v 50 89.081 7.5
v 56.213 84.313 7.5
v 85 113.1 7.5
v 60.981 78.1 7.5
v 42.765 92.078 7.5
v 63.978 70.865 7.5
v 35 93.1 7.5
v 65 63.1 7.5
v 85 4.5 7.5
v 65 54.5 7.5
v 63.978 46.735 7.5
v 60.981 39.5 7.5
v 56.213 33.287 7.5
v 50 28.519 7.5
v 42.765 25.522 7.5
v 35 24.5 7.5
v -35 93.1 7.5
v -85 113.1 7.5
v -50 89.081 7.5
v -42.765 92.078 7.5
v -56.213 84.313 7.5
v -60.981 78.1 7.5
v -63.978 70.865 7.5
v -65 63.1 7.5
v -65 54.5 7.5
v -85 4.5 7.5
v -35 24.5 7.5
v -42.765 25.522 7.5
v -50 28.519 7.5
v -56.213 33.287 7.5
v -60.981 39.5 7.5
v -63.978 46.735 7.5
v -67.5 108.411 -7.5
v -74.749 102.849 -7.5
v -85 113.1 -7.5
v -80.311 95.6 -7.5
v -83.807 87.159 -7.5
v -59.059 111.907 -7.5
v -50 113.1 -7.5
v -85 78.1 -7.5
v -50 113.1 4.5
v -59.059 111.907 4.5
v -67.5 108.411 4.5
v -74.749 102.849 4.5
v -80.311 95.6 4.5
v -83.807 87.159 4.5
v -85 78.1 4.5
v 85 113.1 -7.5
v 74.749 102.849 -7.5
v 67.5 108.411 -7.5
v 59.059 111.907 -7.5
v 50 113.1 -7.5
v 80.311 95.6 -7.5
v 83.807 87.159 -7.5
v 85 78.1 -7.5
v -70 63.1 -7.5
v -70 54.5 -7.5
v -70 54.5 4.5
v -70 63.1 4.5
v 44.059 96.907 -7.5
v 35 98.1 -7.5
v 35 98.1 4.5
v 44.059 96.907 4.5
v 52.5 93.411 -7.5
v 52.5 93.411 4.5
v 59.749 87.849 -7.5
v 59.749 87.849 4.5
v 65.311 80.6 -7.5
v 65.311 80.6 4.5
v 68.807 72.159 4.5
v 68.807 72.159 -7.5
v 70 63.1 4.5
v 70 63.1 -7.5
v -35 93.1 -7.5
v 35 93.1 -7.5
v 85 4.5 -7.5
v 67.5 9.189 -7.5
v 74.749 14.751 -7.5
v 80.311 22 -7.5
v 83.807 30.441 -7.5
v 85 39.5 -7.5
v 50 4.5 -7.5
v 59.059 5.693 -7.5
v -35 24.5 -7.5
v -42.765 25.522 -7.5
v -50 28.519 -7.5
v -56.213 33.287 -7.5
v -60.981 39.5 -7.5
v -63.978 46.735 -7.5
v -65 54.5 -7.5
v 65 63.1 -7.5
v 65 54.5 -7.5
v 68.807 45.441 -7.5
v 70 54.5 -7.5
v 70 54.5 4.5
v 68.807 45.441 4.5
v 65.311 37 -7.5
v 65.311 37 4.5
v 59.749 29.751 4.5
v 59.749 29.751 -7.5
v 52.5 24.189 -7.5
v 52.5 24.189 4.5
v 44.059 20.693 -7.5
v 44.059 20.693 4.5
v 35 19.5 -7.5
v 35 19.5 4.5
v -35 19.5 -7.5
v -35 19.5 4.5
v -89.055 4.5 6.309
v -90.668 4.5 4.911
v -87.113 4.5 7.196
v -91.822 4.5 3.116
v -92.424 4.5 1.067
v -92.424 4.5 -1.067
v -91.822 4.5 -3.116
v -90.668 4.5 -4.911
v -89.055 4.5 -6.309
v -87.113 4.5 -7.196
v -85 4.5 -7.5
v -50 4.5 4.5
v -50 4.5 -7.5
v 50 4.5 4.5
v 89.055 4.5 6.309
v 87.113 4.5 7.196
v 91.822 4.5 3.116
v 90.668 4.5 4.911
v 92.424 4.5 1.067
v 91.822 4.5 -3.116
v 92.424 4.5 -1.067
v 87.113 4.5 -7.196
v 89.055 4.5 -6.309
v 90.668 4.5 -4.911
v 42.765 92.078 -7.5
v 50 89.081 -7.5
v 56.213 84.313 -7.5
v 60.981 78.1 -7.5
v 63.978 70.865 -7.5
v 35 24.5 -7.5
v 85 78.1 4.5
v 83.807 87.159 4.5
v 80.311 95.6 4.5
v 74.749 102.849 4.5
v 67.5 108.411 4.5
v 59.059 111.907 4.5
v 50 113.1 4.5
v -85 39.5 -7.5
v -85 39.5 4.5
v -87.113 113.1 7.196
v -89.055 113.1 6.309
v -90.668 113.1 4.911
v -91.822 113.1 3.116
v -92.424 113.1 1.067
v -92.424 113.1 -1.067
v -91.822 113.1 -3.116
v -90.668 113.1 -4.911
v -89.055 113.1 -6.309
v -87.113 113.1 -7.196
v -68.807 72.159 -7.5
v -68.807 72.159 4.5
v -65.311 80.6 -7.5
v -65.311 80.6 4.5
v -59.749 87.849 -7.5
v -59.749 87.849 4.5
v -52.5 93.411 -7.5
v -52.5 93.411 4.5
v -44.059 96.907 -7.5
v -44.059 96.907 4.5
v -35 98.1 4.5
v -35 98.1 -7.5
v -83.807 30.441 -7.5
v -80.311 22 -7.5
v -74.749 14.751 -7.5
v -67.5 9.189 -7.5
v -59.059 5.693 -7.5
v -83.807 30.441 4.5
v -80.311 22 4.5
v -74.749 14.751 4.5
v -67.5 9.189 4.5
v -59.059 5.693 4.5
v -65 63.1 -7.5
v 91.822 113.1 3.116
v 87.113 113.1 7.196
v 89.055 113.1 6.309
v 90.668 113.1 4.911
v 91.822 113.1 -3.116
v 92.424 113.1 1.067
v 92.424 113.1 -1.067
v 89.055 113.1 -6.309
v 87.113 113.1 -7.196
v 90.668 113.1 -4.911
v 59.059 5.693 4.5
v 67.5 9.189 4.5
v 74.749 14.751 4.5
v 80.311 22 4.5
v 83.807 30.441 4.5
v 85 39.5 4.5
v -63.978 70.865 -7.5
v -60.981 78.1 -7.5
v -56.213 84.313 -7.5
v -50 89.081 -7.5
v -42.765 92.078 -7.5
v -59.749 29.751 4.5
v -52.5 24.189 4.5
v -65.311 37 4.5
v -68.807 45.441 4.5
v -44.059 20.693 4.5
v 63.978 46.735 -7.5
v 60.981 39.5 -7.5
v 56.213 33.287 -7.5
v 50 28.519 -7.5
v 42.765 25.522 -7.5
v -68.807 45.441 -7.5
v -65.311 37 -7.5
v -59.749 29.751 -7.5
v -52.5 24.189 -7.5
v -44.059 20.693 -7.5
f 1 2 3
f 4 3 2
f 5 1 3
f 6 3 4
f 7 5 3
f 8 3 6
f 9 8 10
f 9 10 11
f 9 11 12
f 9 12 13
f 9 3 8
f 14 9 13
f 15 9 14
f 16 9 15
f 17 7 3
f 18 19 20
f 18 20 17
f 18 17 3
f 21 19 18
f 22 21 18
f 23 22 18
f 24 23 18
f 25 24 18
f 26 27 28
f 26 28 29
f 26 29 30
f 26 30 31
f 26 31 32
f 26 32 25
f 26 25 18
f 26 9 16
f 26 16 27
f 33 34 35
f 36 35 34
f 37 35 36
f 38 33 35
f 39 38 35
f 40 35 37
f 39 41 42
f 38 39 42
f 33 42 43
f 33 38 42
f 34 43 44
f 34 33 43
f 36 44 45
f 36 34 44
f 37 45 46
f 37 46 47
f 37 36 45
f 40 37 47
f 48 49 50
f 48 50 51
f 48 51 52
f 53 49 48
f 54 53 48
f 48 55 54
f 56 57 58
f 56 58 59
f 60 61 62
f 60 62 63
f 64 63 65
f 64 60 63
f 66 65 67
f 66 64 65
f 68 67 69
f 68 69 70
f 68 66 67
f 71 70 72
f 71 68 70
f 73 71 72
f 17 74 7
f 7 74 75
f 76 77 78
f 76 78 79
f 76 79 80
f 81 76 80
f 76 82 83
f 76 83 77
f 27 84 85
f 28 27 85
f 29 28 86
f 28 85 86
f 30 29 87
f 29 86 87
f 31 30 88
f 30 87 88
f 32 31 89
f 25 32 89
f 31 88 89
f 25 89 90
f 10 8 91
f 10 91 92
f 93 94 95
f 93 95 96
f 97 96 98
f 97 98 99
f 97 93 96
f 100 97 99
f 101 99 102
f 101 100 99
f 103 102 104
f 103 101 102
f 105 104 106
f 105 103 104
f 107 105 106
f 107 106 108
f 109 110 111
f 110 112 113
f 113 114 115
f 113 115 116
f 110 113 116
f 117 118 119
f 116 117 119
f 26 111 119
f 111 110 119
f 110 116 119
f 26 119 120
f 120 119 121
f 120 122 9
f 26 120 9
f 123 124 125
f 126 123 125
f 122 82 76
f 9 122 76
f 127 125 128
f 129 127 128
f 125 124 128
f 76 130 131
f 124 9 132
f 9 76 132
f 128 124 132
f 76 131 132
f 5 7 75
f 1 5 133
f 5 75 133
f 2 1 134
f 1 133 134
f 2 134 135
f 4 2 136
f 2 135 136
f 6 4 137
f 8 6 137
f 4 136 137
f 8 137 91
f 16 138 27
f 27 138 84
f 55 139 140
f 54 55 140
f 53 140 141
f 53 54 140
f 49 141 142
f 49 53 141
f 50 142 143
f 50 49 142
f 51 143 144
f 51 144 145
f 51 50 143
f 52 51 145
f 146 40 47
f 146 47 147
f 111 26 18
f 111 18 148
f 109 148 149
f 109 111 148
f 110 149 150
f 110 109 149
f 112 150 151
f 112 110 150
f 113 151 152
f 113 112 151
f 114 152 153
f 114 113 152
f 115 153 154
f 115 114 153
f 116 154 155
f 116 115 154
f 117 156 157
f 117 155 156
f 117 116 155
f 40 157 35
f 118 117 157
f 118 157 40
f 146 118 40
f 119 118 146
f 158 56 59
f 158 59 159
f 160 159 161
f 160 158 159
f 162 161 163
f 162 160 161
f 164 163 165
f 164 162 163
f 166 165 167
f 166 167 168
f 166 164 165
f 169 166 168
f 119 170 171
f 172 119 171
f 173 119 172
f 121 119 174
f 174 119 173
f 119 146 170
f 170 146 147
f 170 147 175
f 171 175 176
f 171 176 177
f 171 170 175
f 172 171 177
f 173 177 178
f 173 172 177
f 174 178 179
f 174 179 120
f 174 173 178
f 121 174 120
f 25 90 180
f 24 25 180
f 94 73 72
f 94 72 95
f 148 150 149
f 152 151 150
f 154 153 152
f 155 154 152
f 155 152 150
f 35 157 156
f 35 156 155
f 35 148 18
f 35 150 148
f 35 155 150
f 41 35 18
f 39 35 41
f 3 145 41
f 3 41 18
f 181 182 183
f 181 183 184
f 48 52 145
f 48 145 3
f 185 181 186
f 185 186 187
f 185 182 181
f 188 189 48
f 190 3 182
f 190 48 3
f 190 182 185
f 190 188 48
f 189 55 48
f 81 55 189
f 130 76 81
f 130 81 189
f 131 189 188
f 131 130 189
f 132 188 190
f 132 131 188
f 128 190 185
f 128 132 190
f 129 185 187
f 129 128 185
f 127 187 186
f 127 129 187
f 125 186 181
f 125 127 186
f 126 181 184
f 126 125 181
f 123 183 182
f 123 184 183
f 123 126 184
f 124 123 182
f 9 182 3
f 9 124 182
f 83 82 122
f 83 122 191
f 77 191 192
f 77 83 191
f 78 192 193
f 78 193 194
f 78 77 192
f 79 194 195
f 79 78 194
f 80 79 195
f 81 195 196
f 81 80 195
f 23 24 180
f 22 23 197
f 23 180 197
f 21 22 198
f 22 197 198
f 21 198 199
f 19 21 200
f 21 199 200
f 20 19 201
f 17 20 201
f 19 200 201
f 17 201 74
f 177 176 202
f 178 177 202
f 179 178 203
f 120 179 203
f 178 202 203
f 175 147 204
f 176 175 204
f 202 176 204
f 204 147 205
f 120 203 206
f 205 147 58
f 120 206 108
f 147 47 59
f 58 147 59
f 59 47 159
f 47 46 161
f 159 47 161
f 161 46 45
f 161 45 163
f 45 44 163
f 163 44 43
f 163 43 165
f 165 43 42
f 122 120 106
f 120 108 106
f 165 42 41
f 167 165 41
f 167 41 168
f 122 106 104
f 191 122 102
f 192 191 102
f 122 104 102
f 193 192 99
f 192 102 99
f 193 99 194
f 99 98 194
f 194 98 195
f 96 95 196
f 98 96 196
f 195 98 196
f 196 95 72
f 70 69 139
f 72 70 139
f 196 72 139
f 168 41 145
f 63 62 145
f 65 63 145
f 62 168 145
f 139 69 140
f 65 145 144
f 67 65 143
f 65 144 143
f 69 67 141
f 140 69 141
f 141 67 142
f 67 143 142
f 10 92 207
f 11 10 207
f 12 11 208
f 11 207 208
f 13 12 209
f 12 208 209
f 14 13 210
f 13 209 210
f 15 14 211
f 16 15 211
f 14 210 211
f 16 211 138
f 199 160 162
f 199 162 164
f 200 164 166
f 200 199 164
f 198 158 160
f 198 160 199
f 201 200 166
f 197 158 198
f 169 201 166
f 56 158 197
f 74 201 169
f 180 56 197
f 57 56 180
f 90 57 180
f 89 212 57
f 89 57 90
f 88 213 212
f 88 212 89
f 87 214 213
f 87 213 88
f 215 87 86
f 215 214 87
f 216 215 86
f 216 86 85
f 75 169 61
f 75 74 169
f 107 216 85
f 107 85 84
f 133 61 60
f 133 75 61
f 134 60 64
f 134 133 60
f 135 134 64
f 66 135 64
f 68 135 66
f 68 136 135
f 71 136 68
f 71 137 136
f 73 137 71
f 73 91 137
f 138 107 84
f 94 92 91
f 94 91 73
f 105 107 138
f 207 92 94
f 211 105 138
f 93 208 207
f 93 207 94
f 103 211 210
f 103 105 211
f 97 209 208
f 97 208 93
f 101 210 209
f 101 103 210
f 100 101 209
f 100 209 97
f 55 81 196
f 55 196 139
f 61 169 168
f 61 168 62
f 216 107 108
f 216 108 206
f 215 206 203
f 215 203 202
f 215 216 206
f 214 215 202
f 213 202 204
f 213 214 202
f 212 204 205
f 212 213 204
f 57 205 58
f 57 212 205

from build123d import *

# Parameters (mm, degrees)
BOSS_EXTRUDE1_DEPTH = 117.6
CUT_EXTRUDE4_DEPTH  = 12
CUT_EXTRUDE6_DEPTH  = 151.36957804
CUT_EXTRUDE7_DEPTH  = 4.5
CUT_EXTRUDE8_START  = 113.1
CUT_EXTRUDE8_DEPTH  = 4.5
CUT_EXTRUDE9_DEPTH  = 4.5
CUT_EXTRUDE10_START = 113.1
CUT_EXTRUDE10_DEPTH = 4.5


with BuildPart() as part:
    # Sketch2 → Boss-Extrude1 (new body)
    with BuildSketch(Plane(origin=(0, 0, 0), x_dir=(1, 0, 0), z_dir=(0, 1, 0))):
        with BuildLine():
            Line((85, -7.5), (-85, -7.5))
            ThreePointArc((-85, -7.5), (-92.5, 0), (-85, 7.5))
            Line((-85, 7.5), (85, 7.5))
            ThreePointArc((85, 7.5), (92.5, 0), (85, -7.5))
        make_face()
    extrude(amount=BOSS_EXTRUDE1_DEPTH)

    # Sketch3 → Cut-Extrude4 (cut)
    with BuildSketch(Plane(origin=(0, 0, -7.5), x_dir=(-1, 0, 0), z_dir=(0, 0, -1))):
        with BuildLine():
            Line((-50, 113.1), (50, 113.1))
            ThreePointArc((50, 113.1), (74.748737342, 102.848737342), (85, 78.1))
            Line((85, 78.1), (85, 39.5))
            ThreePointArc((85, 39.5), (74.748737342, 14.751262658), (50, 4.5))
            Line((50, 4.5), (-50, 4.5))
            ThreePointArc((-50, 4.5), (-74.748737342, 14.751262658), (-85, 39.5))
            Line((-85, 39.5), (-85, 78.1))
            ThreePointArc((-85, 78.1), (-74.748737342, 102.848737342), (-50, 113.1))
        make_face()
        with BuildLine():
            Line((-70, 63.1), (-70, 54.5))
            ThreePointArc((-70, 54.5), (-59.748737342, 29.751262658), (-35, 19.5))
            Line((-35, 19.5), (35, 19.5))
            ThreePointArc((35, 19.5), (59.748737342, 29.751262658), (70, 54.5))
            Line((70, 54.5), (70, 63.1))
            ThreePointArc((70, 63.1), (59.748737342, 87.848737342), (35, 98.1))
            Line((35, 98.1), (-35, 98.1))
            ThreePointArc((-35, 98.1), (-59.748737342, 87.848737342), (-70, 63.1))
        make_face(mode=Mode.SUBTRACT)
    extrude(amount=-CUT_EXTRUDE4_DEPTH, mode=Mode.SUBTRACT)

    # Sketch6 → Cut-Extrude6 (cut, through all)
    with BuildSketch(Plane(origin=(0, 0, -7.5), x_dir=(-1, 0, 0), z_dir=(0, 0, -1))):
        with BuildLine():
            Line((-35, 24.5), (35, 24.5))
            ThreePointArc((35, 24.5), (56.213203436, 33.286796564), (65, 54.5))
            Line((65, 54.5), (65, 63.1))
            ThreePointArc((65, 63.1), (56.213203436, 84.313203436), (35, 93.1))
            Line((35, 93.1), (-35, 93.1))
            ThreePointArc((-35, 93.1), (-56.213203436, 84.313203436), (-65, 63.1))
            Line((-65, 63.1), (-65, 54.5))
            ThreePointArc((-65, 54.5), (-56.213203436, 33.286796564), (-35, 24.5))
        make_face()
    extrude(amount=-CUT_EXTRUDE6_DEPTH, mode=Mode.SUBTRACT)

    # Sketch2_6 → Cut-Extrude7 (cut)
    with BuildSketch(Plane(origin=(0, 0, 0), x_dir=(1, 0, 0), z_dir=(0, 1, 0))):
        with BuildLine():
            Line((-8.2248772, -2.5), (8.2248772, -2.5))
            Line((8.2248772, -2.5), (15.34156858, -1.994983292))
            ThreePointArc((15.34156858, -1.994983292), (17.2, 0), (15.34156858, 1.994983292))
            Line((15.34156858, 1.994983292), (1.88348082, 2.95))
            ThreePointArc((1.88348082, 2.95), (0, 3.5), (-1.88348082, 2.95))
            Line((-1.88348082, 2.95), (-15.34156858, 1.994983292))
            ThreePointArc((-15.34156858, 1.994983292), (-17.2, 0), (-15.34156858, -1.994983292))
            Line((-15.34156858, -1.994983292), (-8.2248772, -2.5))
        make_face()
        with BuildLine():
            Line((1.88348082, -2.95), (8.2248772, -2.5))
            Line((8.2248772, -2.5), (-8.2248772, -2.5))
            Line((-8.2248772, -2.5), (-1.88348082, -2.95))
            ThreePointArc((-1.88348082, -2.95), (0, -3.5), (1.88348082, -2.95))
        make_face()
    extrude(amount=CUT_EXTRUDE7_DEPTH, mode=Mode.SUBTRACT)

    # Sketch2_7 → Cut-Extrude8 (cut)
    with BuildSketch(Plane(origin=(0, 0, 0), x_dir=(1, 0, 0), z_dir=(0, 1, 0)).offset(CUT_EXTRUDE8_START)):
        with BuildLine():
            Line((-8.2248772, -2.5), (8.2248772, -2.5))
            Line((8.2248772, -2.5), (15.34156858, -1.994983292))
            ThreePointArc((15.34156858, -1.994983292), (17.2, 0), (15.34156858, 1.994983292))
            Line((15.34156858, 1.994983292), (1.88348082, 2.95))
            ThreePointArc((1.88348082, 2.95), (0, 3.5), (-1.88348082, 2.95))
            Line((-1.88348082, 2.95), (-15.34156858, 1.994983292))
            ThreePointArc((-15.34156858, 1.994983292), (-17.2, 0), (-15.34156858, -1.994983292))
            Line((-15.34156858, -1.994983292), (-8.2248772, -2.5))
        make_face()
        with BuildLine():
            Line((1.88348082, -2.95), (8.2248772, -2.5))
            Line((8.2248772, -2.5), (-8.2248772, -2.5))
            Line((-8.2248772, -2.5), (-1.88348082, -2.95))
            ThreePointArc((-1.88348082, -2.95), (0, -3.5), (1.88348082, -2.95))
        make_face()
    extrude(amount=CUT_EXTRUDE8_DEPTH, mode=Mode.SUBTRACT)

    # Sketch2_8 → Cut-Extrude9 (cut)
    with BuildSketch(Plane(origin=(0, 0, 0), x_dir=(1, 0, 0), z_dir=(0, 1, 0))):
        with BuildLine():
            Line((85, -2.5), (85, 7.5))
            Line((85, 7.5), (-85, 7.5))
            Line((-85, 7.5), (-85, -2.5))
            Line((-85, -2.5), (-8.2248772, -2.5))
            Line((-8.2248772, -2.5), (-15.34156858, -1.994983292))
            ThreePointArc((-15.34156858, -1.994983292), (-17.2, 0), (-15.34156858, 1.994983292))
            Line((-15.34156858, 1.994983292), (-1.88348082, 2.95))
            ThreePointArc((-1.88348082, 2.95), (0, 3.5), (1.88348082, 2.95))
            Line((1.88348082, 2.95), (15.34156858, 1.994983292))
            ThreePointArc((15.34156858, 1.994983292), (17.2, 0), (15.34156858, -1.994983292))
            Line((15.34156858, -1.994983292), (8.2248772, -2.5))
            Line((8.2248772, -2.5), (85, -2.5))
        make_face()
        with BuildLine():
            Line((70, -7.5), (85, -7.5))
            ThreePointArc((85, -7.5), (92.5, 0), (85, 7.5))
            Line((85, 7.5), (85, -2.5))
            Line((85, -2.5), (8.2248772, -2.5))
            Line((8.2248772, -2.5), (1.88348082, -2.95))
            ThreePointArc((1.88348082, -2.95), (0, -3.5), (-1.88348082, -2.95))
            Line((-1.88348082, -2.95), (-8.2248772, -2.5))
            Line((-8.2248772, -2.5), (-85, -2.5))
            Line((-85, -2.5), (-85, 7.5))
            ThreePointArc((-85, 7.5), (-92.5, 0), (-85, -7.5))
            Line((-85, -7.5), (-70, -7.5))
            Line((-70, -7.5), (-55, -7.5))
            Line((-55, -7.5), (55, -7.5))
            Line((55, -7.5), (70, -7.5))
        make_face()
        with BuildLine():
            Line((1.88348082, -2.95), (8.2248772, -2.5))
            Line((8.2248772, -2.5), (-8.2248772, -2.5))
            Line((-8.2248772, -2.5), (-1.88348082, -2.95))
            ThreePointArc((-1.88348082, -2.95), (0, -3.5), (1.88348082, -2.95))
        make_face()
    extrude(amount=CUT_EXTRUDE9_DEPTH, mode=Mode.SUBTRACT)

    # Sketch2_9 → Cut-Extrude10 (cut)
    with BuildSketch(Plane(origin=(0, 0, 0), x_dir=(1, 0, 0), z_dir=(0, 1, 0)).offset(CUT_EXTRUDE10_START)):
        with BuildLine():
            Line((85, -2.5), (85, 7.5))
            Line((85, 7.5), (-85, 7.5))
            Line((-85, 7.5), (-85, -2.5))
            Line((-85, -2.5), (-8.2248772, -2.5))
            Line((-8.2248772, -2.5), (-15.34156858, -1.994983292))
            ThreePointArc((-15.34156858, -1.994983292), (-17.2, 0), (-15.34156858, 1.994983292))
            Line((-15.34156858, 1.994983292), (-1.88348082, 2.95))
            ThreePointArc((-1.88348082, 2.95), (0, 3.5), (1.88348082, 2.95))
            Line((1.88348082, 2.95), (15.34156858, 1.994983292))
            ThreePointArc((15.34156858, 1.994983292), (17.2, 0), (15.34156858, -1.994983292))
            Line((15.34156858, -1.994983292), (8.2248772, -2.5))
            Line((8.2248772, -2.5), (85, -2.5))
        make_face()
        with BuildLine():
            Line((70, -7.5), (85, -7.5))
            ThreePointArc((85, -7.5), (92.5, 0), (85, 7.5))
            Line((85, 7.5), (85, -2.5))
            Line((85, -2.5), (8.2248772, -2.5))
            Line((8.2248772, -2.5), (1.88348082, -2.95))
            ThreePointArc((1.88348082, -2.95), (0, -3.5), (-1.88348082, -2.95))
            Line((-1.88348082, -2.95), (-8.2248772, -2.5))
            Line((-8.2248772, -2.5), (-85, -2.5))
            Line((-85, -2.5), (-85, 7.5))
            ThreePointArc((-85, 7.5), (-92.5, 0), (-85, -7.5))
            Line((-85, -7.5), (-70, -7.5))
            Line((-70, -7.5), (-55, -7.5))
            Line((-55, -7.5), (55, -7.5))
            Line((55, -7.5), (70, -7.5))
        make_face()
        with BuildLine():
            Line((-8.2248772, -2.5), (8.2248772, -2.5))
            Line((8.2248772, -2.5), (15.34156858, -1.994983292))
            ThreePointArc((15.34156858, -1.994983292), (17.2, 0), (15.34156858, 1.994983292))
            Line((15.34156858, 1.994983292), (1.88348082, 2.95))
            ThreePointArc((1.88348082, 2.95), (0, 3.5), (-1.88348082, 2.95))
            Line((-1.88348082, 2.95), (-15.34156858, 1.994983292))
            ThreePointArc((-15.34156858, 1.994983292), (-17.2, 0), (-15.34156858, -1.994983292))
            Line((-15.34156858, -1.994983292), (-8.2248772, -2.5))
        make_face()
        with BuildLine():
            Line((1.88348082, -2.95), (8.2248772, -2.5))
            Line((8.2248772, -2.5), (-8.2248772, -2.5))
            Line((-8.2248772, -2.5), (-1.88348082, -2.95))
            ThreePointArc((-1.88348082, -2.95), (0, -3.5), (1.88348082, -2.95))
        make_face()
    extrude(amount=CUT_EXTRUDE10_DEPTH, mode=Mode.SUBTRACT)


solid = part.part
